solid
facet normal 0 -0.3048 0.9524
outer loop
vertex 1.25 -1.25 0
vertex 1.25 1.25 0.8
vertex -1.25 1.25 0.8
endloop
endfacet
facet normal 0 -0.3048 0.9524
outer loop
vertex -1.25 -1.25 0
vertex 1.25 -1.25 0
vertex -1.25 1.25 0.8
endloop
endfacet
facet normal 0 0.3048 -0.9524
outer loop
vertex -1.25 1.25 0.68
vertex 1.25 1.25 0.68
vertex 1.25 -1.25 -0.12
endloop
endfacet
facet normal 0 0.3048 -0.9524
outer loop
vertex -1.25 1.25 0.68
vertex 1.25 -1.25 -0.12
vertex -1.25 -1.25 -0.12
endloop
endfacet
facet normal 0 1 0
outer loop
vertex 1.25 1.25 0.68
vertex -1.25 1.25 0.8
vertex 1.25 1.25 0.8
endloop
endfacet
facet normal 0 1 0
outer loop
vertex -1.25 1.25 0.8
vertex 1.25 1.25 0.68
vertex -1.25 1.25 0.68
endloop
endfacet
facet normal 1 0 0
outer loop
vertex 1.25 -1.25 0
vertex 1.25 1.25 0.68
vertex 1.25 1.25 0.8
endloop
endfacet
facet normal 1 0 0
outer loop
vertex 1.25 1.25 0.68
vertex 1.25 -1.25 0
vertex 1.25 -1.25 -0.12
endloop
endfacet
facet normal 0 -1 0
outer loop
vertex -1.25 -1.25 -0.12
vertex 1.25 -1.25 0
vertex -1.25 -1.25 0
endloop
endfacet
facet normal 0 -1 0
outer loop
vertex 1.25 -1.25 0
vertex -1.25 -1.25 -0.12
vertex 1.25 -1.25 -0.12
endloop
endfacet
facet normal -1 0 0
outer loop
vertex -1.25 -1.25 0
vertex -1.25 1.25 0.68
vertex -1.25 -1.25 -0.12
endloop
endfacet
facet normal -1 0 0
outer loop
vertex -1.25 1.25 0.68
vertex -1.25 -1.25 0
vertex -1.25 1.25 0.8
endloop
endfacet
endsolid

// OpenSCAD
// Shed shell kit: roof slope. See lib/lodge_kit.scad.
include <lib/lodge_kit.scad>
kind = "shed";
roof_tile([1, 1, 0, 0], 0);
